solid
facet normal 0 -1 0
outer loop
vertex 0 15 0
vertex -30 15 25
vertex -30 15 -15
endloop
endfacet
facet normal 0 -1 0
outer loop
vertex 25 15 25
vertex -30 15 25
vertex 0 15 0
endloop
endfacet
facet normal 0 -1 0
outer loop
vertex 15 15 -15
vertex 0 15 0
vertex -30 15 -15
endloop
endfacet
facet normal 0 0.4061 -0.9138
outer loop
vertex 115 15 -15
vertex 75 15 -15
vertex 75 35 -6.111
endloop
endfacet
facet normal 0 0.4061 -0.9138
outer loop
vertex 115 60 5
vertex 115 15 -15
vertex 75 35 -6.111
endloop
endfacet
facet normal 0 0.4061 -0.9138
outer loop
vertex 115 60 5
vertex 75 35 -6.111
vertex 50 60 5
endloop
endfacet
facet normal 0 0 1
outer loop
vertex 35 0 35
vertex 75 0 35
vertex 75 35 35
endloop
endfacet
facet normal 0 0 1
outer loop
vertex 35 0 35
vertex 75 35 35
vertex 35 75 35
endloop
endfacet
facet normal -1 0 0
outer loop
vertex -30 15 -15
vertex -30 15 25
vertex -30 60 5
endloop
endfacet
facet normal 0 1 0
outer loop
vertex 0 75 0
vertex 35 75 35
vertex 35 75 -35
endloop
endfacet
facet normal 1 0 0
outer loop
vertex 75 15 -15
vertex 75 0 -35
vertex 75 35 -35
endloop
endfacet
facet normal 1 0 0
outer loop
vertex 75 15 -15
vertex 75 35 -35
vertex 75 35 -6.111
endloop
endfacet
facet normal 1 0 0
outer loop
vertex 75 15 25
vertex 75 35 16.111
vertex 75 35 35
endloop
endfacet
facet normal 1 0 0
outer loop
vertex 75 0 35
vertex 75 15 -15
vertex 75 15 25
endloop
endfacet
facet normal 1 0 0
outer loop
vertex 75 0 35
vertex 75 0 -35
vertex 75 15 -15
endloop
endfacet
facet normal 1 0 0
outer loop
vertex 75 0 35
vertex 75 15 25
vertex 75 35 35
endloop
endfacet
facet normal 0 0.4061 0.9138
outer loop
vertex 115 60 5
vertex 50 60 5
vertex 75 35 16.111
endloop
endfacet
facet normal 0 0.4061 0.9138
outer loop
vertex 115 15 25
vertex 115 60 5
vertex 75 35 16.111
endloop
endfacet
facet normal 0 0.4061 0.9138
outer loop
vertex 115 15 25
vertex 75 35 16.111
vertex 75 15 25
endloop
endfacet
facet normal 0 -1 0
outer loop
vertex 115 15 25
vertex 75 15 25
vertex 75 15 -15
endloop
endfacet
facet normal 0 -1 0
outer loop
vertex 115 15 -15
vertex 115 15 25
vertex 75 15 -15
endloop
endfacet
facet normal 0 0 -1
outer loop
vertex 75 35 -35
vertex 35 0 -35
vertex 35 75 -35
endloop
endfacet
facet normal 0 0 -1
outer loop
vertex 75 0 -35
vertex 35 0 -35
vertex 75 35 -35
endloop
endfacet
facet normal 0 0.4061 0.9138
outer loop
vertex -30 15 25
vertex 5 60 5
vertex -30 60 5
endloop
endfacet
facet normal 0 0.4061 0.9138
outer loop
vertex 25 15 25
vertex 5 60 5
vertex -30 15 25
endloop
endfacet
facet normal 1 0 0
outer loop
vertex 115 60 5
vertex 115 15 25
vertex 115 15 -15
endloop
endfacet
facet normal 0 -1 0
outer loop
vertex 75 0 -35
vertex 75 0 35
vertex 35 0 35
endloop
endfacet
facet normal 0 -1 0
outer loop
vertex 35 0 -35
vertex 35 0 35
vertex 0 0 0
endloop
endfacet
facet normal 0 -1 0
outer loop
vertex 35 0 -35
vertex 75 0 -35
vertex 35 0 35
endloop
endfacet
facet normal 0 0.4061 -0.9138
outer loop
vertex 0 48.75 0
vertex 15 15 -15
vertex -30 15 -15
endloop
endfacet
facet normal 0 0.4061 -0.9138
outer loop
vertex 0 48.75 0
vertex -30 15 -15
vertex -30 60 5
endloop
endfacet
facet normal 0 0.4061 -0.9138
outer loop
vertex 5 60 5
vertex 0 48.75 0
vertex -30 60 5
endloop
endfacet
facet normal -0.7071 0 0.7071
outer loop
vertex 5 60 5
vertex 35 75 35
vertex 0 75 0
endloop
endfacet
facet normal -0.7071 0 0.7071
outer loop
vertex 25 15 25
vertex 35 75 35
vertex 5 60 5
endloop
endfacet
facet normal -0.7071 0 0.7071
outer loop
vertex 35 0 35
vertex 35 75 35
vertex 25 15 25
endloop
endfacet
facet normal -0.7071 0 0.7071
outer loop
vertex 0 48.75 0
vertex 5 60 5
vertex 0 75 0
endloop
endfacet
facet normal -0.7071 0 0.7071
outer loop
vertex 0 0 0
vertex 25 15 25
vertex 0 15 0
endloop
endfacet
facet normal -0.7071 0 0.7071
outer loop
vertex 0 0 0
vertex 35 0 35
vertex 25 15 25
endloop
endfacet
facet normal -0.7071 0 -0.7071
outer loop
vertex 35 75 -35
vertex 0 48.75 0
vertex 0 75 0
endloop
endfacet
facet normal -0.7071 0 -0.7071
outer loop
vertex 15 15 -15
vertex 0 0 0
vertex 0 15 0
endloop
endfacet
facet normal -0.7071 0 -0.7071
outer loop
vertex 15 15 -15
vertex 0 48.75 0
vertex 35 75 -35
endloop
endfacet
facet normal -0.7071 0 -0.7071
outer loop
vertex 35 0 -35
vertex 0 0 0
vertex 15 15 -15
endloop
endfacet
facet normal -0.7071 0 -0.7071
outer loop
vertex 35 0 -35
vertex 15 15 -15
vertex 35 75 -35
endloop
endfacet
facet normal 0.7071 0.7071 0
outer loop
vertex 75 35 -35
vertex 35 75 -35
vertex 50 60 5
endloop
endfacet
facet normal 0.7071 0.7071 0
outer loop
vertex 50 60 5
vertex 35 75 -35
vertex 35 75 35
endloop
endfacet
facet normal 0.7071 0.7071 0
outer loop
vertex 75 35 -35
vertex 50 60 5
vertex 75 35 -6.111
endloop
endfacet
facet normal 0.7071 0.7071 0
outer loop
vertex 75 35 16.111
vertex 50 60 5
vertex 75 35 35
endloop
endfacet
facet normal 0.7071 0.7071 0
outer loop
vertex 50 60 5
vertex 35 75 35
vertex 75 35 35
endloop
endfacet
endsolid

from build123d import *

# Parameters (mm, degrees)
EXTRUDE1_DEPTH      = 75
CUT_EXTRUDE1_DEPTH  = 71
EXTRUDE2_DEPTH      = 40
EXTRUDE2_DEPTH_BACK = 105


with BuildPart() as part:
    # Sketch1 → Extrude1 (new body)
    with BuildSketch(Plane(origin=(0, 0, 0), x_dir=(1, 0, 0), z_dir=(0, 1, 0))):
        Polygon((0, 0), (35, 35), (75, 35), (75, -35), (35, -35), align=None)
    extrude(amount=EXTRUDE1_DEPTH)

    # Sketch2 → Cut-Extrude1 (cut, through all)
    with BuildSketch(Plane.XY.offset(35)):
        Polygon((35, 75), (75, 35), (75, 75), align=None)
    extrude(amount=-CUT_EXTRUDE1_DEPTH, mode=Mode.SUBTRACT)

    # Sketch3 → Extrude2 (add, two sides)
    with BuildSketch(Plane(origin=(75, 0, 0), x_dir=(0, 0, -1), z_dir=(1, 0, 0))) as extrude2_sk:
        Polygon((-25, 15), (15, 15), (-5, 60), align=None)
    extrude(amount=EXTRUDE2_DEPTH)
    extrude(extrude2_sk.sketch, amount=-EXTRUDE2_DEPTH_BACK)


solid = part.part
